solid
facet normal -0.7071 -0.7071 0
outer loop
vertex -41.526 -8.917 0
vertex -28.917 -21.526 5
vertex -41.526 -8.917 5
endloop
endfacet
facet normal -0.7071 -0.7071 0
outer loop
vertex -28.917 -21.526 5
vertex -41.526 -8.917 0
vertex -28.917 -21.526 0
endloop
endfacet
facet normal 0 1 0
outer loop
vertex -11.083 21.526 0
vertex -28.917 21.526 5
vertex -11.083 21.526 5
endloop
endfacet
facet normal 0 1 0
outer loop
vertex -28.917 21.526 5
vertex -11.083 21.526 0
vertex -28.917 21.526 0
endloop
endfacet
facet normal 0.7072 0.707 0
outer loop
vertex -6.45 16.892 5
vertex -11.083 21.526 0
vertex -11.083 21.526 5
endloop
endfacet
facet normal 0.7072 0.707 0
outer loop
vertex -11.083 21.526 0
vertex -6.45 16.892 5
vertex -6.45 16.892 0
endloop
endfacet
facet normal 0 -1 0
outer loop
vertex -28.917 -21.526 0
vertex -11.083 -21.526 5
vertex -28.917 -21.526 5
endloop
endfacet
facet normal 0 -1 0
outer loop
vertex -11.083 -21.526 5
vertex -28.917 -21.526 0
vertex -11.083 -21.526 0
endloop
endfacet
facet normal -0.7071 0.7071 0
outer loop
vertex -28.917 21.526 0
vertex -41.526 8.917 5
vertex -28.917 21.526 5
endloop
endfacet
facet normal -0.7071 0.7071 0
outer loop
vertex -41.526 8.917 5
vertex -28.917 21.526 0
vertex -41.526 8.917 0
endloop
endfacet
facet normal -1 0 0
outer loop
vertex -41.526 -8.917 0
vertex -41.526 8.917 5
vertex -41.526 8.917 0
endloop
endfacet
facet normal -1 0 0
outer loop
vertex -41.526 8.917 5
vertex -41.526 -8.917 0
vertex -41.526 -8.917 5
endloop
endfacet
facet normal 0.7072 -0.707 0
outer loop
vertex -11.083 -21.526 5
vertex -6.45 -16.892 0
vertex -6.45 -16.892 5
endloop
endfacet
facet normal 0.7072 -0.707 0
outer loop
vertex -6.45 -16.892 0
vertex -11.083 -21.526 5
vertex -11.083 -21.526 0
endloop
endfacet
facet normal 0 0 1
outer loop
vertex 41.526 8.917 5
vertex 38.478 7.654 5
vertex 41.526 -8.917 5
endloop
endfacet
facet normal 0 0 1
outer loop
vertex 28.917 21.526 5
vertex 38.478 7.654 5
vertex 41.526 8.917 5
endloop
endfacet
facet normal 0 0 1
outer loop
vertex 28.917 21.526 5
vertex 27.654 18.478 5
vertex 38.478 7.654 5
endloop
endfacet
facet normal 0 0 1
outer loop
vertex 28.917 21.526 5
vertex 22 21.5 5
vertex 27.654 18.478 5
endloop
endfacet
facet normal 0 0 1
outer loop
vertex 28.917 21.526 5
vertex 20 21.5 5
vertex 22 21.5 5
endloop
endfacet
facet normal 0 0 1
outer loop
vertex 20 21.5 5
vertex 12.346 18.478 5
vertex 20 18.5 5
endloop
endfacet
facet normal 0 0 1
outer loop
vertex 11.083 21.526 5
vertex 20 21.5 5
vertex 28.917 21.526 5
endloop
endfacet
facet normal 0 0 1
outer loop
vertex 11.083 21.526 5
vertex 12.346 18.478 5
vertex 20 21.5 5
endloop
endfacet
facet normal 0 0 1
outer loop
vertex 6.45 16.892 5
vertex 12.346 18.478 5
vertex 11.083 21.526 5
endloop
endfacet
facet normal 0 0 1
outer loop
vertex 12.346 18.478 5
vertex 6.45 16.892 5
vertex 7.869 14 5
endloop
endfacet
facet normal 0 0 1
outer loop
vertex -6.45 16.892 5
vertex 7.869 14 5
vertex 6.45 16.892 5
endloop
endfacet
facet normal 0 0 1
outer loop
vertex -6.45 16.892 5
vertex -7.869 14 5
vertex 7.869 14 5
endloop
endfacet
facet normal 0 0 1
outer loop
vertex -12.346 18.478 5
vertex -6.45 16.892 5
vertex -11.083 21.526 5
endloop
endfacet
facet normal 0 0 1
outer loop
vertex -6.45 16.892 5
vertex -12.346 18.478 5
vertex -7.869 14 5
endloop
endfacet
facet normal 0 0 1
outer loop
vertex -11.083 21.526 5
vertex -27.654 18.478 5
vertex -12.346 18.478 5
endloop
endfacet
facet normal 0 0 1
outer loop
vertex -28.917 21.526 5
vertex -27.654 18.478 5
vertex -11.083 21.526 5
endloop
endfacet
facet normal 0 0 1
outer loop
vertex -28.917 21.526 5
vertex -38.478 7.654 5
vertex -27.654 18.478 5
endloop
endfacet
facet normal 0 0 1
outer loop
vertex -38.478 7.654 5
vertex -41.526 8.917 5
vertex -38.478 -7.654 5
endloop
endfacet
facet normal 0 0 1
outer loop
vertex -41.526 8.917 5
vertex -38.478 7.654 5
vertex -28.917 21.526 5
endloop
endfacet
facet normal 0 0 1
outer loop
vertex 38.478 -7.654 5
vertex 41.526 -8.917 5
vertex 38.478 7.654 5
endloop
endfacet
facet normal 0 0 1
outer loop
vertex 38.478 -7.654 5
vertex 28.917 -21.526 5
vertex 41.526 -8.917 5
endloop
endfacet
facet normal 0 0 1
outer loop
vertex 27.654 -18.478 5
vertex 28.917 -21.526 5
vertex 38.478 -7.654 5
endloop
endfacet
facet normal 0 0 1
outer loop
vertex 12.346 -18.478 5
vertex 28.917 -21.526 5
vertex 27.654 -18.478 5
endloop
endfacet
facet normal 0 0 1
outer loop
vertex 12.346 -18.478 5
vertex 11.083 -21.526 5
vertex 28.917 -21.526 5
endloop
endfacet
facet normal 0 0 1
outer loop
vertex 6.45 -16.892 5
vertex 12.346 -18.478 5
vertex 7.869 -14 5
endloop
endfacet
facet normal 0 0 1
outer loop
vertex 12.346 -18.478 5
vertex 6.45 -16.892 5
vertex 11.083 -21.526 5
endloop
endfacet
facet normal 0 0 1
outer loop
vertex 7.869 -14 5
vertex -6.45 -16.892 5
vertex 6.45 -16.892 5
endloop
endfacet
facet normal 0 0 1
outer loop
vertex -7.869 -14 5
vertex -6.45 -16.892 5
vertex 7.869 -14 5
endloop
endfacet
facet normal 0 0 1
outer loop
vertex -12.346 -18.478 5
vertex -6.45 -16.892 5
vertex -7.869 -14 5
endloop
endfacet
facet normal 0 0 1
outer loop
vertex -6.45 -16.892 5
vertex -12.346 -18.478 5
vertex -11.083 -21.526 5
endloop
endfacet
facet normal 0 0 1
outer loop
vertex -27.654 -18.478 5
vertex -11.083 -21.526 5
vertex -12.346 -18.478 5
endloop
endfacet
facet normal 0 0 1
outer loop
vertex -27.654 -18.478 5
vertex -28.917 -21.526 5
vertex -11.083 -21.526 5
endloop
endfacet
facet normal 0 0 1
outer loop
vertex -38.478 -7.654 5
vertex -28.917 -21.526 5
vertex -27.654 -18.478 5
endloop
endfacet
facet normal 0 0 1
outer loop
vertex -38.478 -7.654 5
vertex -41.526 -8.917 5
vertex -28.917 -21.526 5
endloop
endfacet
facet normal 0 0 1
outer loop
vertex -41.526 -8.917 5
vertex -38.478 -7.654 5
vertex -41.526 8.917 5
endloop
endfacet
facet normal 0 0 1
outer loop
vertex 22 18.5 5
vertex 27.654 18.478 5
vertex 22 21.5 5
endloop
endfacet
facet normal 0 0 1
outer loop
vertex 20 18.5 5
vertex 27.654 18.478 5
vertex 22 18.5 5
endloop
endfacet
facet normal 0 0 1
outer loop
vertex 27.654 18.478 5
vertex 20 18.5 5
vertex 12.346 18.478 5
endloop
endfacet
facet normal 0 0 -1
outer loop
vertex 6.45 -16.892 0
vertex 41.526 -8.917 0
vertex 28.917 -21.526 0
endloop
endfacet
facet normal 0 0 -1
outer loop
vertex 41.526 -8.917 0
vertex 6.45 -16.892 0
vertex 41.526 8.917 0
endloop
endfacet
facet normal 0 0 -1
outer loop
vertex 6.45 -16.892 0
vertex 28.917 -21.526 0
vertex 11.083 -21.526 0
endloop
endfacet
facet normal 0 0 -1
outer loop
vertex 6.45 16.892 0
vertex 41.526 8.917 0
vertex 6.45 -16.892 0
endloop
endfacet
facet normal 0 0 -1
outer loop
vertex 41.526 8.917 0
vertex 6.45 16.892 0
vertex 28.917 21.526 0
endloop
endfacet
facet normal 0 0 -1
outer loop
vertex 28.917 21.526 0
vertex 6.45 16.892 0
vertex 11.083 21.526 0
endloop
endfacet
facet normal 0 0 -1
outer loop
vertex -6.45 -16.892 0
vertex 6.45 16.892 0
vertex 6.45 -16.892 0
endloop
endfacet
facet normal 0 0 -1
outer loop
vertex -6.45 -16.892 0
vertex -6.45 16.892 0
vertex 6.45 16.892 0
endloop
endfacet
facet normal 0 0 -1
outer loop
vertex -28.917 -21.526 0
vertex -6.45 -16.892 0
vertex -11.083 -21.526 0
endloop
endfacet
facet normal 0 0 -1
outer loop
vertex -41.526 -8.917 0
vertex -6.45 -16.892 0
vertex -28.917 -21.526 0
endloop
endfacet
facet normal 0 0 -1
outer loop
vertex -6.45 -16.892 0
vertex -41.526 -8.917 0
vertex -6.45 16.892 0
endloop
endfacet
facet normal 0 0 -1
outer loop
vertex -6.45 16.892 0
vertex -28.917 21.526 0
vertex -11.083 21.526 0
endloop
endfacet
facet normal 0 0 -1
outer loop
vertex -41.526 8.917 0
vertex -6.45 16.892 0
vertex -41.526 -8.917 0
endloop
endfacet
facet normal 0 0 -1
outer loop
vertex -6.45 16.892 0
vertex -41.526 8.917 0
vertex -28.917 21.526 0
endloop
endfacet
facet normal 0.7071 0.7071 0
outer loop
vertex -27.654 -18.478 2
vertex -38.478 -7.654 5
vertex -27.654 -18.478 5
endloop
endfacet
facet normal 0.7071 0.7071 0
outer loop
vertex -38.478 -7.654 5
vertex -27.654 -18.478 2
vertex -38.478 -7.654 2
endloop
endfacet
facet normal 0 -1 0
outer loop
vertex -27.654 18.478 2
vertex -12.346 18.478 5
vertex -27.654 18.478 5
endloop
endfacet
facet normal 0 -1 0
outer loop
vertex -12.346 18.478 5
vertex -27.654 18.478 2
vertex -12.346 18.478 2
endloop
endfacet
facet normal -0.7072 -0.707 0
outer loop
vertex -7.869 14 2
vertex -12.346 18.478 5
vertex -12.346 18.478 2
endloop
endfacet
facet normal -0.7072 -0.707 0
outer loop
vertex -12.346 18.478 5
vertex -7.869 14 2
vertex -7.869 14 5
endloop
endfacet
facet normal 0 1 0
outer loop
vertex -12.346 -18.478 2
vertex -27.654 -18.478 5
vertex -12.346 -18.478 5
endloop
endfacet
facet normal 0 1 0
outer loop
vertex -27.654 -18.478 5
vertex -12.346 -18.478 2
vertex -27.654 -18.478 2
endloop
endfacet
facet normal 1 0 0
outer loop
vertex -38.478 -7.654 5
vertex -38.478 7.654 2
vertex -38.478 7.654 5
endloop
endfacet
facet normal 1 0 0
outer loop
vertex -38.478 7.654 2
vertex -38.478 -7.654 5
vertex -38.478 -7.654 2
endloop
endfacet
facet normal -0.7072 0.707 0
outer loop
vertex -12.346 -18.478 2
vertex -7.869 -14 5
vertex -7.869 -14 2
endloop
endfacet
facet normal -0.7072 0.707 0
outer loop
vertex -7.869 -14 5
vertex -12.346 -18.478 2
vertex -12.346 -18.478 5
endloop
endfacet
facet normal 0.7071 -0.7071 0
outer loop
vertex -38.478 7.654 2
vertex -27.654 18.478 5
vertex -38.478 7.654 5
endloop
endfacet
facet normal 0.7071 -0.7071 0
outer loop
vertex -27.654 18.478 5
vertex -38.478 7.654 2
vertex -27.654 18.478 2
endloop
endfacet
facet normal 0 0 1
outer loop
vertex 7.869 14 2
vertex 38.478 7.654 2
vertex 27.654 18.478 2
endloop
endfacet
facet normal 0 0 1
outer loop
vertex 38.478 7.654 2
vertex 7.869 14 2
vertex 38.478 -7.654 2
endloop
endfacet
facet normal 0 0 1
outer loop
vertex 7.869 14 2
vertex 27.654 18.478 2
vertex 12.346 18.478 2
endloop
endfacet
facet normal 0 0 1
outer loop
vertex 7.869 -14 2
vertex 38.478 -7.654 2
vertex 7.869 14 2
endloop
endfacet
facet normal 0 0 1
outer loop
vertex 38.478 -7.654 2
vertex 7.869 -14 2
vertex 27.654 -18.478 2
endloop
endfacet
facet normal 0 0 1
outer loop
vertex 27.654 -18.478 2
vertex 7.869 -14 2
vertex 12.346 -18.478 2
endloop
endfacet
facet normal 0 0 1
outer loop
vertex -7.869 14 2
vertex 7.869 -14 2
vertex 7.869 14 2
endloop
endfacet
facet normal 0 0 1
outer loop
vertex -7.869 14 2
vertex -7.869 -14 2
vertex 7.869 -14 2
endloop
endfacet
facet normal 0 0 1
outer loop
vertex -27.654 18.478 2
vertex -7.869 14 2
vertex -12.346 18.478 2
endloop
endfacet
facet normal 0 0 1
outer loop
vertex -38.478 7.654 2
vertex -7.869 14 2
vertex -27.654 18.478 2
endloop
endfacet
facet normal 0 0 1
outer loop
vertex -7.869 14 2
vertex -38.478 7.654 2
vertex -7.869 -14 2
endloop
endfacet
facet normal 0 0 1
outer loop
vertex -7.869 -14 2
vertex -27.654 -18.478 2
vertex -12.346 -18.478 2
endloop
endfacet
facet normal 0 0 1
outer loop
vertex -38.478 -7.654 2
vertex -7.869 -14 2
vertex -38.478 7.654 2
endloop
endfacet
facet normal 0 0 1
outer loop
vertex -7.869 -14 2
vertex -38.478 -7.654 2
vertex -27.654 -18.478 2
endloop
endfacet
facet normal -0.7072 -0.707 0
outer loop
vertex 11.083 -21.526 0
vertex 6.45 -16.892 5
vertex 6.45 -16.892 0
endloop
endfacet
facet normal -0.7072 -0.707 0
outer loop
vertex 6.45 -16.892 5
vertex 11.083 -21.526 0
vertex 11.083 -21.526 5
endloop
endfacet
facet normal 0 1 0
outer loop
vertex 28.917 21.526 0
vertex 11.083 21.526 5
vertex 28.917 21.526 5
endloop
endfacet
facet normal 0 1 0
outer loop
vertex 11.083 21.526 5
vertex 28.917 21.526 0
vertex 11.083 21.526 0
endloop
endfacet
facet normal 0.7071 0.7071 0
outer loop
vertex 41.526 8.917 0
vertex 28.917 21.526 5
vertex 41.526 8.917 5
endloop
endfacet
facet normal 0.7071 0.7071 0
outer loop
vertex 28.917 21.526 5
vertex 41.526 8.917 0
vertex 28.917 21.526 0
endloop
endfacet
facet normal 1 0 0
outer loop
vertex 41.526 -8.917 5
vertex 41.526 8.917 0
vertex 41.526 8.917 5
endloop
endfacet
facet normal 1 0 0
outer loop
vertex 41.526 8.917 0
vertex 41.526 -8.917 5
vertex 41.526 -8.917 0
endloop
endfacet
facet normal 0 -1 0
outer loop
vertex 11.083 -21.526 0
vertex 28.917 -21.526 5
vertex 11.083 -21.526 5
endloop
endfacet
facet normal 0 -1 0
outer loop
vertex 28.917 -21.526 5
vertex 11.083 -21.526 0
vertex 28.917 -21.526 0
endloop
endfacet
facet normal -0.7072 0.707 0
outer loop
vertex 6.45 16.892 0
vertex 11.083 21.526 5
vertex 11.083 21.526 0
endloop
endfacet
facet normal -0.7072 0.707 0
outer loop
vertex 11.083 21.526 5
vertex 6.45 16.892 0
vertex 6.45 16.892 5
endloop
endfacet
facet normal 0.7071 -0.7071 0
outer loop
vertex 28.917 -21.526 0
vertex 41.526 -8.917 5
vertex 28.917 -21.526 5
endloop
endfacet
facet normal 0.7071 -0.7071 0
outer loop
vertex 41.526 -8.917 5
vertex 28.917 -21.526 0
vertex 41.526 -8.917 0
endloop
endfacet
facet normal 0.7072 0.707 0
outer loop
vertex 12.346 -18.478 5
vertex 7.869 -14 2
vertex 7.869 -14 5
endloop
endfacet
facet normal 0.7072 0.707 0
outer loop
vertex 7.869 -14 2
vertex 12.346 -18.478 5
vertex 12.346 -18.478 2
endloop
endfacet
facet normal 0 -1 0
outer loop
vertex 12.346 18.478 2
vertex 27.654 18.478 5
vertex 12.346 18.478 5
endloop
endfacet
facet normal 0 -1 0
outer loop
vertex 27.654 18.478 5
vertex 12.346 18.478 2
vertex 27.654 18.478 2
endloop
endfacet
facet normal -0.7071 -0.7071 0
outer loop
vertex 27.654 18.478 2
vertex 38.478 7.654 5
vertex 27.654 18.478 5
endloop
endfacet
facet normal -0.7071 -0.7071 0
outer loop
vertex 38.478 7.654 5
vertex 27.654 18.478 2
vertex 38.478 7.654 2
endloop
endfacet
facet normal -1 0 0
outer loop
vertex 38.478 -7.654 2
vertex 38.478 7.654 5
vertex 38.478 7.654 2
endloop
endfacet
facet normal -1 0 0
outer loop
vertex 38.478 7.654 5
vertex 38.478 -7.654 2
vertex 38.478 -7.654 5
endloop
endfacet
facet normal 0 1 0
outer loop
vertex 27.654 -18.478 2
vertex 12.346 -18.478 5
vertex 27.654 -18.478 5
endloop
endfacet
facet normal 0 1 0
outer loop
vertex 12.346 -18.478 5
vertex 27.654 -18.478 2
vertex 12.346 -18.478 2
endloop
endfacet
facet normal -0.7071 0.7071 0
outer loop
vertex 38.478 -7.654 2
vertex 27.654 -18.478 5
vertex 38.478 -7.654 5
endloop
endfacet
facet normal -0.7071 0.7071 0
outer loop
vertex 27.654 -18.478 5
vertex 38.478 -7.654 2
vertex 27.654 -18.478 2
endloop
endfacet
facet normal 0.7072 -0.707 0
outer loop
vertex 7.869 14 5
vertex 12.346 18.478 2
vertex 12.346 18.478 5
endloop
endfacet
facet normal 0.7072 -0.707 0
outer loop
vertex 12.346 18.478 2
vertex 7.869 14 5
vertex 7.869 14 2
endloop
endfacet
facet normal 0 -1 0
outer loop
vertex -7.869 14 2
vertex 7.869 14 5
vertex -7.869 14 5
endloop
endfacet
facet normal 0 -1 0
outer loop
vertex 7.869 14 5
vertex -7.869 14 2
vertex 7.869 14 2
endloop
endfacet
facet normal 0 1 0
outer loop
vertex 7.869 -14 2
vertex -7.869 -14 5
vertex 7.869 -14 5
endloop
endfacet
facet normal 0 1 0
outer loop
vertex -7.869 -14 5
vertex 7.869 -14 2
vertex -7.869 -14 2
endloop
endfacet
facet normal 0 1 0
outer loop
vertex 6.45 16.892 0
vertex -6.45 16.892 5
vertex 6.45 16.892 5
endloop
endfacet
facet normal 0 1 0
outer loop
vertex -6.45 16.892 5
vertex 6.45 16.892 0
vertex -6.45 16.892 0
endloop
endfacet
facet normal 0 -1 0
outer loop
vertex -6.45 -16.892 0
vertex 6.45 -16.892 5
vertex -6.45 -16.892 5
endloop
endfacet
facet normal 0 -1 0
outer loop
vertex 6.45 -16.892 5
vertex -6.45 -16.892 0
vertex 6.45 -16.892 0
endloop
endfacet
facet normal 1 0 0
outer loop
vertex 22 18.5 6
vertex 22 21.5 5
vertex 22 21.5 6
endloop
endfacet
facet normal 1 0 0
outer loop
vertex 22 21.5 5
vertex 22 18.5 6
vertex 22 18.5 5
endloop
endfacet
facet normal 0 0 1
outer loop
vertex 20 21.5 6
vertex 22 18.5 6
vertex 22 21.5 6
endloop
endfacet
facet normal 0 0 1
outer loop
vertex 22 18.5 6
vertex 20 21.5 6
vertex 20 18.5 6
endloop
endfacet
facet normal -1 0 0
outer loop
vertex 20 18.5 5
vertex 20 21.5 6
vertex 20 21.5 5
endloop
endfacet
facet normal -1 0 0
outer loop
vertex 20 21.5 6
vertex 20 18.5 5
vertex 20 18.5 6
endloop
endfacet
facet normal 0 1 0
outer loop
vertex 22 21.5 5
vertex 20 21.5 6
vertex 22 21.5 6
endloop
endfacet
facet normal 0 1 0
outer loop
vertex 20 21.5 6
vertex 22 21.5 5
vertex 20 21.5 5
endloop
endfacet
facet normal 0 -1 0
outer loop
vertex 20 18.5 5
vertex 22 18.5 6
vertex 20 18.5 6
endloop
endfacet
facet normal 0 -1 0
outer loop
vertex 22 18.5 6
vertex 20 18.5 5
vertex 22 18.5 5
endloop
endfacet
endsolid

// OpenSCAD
s = 1.165; // 3mm wall thickness 1.165
b = 2.0;
d = 3+b;

module mage()
{
    translate([-20, 0, 0])
    {
    difference()
    {
        union()
        {
            difference()
            {
                rotate([0, 0, 360/16]) scale([s, s, 1])cylinder(r=20, h=d, $fn=8);
                translate([0, 0, b]) rotate([0, 0, 360/16]) cylinder(r=20, h=d, $fn=8);
            }

            difference()
            {
                translate([40, 0, 0]) rotate([0, 0, 360/16]) scale([s, s, 1]) cylinder(r=20, h=d, $fn=8);
                translate([0, 0, b]) translate([40, 0, 0]) rotate([0, 0, 360/16]) cylinder(r=20, h=d, $fn=8);
            }
        }

        translate([0, 0, b]) translate([20, 0, d/2]) cube([20, 28, d], center=true);
    }

    difference()
    {
        translate([20, 0, d/2]) scale([s, s, 1]) cube([12, 29, d], center=true);
        translate([0, 0, b]) translate([20, 0, d/2]) cube([16, 28, d], center=true);
    }
}
}

translate([20, 18.5, 0]) color("red") cube([2, 3, d+1]);
mage();
